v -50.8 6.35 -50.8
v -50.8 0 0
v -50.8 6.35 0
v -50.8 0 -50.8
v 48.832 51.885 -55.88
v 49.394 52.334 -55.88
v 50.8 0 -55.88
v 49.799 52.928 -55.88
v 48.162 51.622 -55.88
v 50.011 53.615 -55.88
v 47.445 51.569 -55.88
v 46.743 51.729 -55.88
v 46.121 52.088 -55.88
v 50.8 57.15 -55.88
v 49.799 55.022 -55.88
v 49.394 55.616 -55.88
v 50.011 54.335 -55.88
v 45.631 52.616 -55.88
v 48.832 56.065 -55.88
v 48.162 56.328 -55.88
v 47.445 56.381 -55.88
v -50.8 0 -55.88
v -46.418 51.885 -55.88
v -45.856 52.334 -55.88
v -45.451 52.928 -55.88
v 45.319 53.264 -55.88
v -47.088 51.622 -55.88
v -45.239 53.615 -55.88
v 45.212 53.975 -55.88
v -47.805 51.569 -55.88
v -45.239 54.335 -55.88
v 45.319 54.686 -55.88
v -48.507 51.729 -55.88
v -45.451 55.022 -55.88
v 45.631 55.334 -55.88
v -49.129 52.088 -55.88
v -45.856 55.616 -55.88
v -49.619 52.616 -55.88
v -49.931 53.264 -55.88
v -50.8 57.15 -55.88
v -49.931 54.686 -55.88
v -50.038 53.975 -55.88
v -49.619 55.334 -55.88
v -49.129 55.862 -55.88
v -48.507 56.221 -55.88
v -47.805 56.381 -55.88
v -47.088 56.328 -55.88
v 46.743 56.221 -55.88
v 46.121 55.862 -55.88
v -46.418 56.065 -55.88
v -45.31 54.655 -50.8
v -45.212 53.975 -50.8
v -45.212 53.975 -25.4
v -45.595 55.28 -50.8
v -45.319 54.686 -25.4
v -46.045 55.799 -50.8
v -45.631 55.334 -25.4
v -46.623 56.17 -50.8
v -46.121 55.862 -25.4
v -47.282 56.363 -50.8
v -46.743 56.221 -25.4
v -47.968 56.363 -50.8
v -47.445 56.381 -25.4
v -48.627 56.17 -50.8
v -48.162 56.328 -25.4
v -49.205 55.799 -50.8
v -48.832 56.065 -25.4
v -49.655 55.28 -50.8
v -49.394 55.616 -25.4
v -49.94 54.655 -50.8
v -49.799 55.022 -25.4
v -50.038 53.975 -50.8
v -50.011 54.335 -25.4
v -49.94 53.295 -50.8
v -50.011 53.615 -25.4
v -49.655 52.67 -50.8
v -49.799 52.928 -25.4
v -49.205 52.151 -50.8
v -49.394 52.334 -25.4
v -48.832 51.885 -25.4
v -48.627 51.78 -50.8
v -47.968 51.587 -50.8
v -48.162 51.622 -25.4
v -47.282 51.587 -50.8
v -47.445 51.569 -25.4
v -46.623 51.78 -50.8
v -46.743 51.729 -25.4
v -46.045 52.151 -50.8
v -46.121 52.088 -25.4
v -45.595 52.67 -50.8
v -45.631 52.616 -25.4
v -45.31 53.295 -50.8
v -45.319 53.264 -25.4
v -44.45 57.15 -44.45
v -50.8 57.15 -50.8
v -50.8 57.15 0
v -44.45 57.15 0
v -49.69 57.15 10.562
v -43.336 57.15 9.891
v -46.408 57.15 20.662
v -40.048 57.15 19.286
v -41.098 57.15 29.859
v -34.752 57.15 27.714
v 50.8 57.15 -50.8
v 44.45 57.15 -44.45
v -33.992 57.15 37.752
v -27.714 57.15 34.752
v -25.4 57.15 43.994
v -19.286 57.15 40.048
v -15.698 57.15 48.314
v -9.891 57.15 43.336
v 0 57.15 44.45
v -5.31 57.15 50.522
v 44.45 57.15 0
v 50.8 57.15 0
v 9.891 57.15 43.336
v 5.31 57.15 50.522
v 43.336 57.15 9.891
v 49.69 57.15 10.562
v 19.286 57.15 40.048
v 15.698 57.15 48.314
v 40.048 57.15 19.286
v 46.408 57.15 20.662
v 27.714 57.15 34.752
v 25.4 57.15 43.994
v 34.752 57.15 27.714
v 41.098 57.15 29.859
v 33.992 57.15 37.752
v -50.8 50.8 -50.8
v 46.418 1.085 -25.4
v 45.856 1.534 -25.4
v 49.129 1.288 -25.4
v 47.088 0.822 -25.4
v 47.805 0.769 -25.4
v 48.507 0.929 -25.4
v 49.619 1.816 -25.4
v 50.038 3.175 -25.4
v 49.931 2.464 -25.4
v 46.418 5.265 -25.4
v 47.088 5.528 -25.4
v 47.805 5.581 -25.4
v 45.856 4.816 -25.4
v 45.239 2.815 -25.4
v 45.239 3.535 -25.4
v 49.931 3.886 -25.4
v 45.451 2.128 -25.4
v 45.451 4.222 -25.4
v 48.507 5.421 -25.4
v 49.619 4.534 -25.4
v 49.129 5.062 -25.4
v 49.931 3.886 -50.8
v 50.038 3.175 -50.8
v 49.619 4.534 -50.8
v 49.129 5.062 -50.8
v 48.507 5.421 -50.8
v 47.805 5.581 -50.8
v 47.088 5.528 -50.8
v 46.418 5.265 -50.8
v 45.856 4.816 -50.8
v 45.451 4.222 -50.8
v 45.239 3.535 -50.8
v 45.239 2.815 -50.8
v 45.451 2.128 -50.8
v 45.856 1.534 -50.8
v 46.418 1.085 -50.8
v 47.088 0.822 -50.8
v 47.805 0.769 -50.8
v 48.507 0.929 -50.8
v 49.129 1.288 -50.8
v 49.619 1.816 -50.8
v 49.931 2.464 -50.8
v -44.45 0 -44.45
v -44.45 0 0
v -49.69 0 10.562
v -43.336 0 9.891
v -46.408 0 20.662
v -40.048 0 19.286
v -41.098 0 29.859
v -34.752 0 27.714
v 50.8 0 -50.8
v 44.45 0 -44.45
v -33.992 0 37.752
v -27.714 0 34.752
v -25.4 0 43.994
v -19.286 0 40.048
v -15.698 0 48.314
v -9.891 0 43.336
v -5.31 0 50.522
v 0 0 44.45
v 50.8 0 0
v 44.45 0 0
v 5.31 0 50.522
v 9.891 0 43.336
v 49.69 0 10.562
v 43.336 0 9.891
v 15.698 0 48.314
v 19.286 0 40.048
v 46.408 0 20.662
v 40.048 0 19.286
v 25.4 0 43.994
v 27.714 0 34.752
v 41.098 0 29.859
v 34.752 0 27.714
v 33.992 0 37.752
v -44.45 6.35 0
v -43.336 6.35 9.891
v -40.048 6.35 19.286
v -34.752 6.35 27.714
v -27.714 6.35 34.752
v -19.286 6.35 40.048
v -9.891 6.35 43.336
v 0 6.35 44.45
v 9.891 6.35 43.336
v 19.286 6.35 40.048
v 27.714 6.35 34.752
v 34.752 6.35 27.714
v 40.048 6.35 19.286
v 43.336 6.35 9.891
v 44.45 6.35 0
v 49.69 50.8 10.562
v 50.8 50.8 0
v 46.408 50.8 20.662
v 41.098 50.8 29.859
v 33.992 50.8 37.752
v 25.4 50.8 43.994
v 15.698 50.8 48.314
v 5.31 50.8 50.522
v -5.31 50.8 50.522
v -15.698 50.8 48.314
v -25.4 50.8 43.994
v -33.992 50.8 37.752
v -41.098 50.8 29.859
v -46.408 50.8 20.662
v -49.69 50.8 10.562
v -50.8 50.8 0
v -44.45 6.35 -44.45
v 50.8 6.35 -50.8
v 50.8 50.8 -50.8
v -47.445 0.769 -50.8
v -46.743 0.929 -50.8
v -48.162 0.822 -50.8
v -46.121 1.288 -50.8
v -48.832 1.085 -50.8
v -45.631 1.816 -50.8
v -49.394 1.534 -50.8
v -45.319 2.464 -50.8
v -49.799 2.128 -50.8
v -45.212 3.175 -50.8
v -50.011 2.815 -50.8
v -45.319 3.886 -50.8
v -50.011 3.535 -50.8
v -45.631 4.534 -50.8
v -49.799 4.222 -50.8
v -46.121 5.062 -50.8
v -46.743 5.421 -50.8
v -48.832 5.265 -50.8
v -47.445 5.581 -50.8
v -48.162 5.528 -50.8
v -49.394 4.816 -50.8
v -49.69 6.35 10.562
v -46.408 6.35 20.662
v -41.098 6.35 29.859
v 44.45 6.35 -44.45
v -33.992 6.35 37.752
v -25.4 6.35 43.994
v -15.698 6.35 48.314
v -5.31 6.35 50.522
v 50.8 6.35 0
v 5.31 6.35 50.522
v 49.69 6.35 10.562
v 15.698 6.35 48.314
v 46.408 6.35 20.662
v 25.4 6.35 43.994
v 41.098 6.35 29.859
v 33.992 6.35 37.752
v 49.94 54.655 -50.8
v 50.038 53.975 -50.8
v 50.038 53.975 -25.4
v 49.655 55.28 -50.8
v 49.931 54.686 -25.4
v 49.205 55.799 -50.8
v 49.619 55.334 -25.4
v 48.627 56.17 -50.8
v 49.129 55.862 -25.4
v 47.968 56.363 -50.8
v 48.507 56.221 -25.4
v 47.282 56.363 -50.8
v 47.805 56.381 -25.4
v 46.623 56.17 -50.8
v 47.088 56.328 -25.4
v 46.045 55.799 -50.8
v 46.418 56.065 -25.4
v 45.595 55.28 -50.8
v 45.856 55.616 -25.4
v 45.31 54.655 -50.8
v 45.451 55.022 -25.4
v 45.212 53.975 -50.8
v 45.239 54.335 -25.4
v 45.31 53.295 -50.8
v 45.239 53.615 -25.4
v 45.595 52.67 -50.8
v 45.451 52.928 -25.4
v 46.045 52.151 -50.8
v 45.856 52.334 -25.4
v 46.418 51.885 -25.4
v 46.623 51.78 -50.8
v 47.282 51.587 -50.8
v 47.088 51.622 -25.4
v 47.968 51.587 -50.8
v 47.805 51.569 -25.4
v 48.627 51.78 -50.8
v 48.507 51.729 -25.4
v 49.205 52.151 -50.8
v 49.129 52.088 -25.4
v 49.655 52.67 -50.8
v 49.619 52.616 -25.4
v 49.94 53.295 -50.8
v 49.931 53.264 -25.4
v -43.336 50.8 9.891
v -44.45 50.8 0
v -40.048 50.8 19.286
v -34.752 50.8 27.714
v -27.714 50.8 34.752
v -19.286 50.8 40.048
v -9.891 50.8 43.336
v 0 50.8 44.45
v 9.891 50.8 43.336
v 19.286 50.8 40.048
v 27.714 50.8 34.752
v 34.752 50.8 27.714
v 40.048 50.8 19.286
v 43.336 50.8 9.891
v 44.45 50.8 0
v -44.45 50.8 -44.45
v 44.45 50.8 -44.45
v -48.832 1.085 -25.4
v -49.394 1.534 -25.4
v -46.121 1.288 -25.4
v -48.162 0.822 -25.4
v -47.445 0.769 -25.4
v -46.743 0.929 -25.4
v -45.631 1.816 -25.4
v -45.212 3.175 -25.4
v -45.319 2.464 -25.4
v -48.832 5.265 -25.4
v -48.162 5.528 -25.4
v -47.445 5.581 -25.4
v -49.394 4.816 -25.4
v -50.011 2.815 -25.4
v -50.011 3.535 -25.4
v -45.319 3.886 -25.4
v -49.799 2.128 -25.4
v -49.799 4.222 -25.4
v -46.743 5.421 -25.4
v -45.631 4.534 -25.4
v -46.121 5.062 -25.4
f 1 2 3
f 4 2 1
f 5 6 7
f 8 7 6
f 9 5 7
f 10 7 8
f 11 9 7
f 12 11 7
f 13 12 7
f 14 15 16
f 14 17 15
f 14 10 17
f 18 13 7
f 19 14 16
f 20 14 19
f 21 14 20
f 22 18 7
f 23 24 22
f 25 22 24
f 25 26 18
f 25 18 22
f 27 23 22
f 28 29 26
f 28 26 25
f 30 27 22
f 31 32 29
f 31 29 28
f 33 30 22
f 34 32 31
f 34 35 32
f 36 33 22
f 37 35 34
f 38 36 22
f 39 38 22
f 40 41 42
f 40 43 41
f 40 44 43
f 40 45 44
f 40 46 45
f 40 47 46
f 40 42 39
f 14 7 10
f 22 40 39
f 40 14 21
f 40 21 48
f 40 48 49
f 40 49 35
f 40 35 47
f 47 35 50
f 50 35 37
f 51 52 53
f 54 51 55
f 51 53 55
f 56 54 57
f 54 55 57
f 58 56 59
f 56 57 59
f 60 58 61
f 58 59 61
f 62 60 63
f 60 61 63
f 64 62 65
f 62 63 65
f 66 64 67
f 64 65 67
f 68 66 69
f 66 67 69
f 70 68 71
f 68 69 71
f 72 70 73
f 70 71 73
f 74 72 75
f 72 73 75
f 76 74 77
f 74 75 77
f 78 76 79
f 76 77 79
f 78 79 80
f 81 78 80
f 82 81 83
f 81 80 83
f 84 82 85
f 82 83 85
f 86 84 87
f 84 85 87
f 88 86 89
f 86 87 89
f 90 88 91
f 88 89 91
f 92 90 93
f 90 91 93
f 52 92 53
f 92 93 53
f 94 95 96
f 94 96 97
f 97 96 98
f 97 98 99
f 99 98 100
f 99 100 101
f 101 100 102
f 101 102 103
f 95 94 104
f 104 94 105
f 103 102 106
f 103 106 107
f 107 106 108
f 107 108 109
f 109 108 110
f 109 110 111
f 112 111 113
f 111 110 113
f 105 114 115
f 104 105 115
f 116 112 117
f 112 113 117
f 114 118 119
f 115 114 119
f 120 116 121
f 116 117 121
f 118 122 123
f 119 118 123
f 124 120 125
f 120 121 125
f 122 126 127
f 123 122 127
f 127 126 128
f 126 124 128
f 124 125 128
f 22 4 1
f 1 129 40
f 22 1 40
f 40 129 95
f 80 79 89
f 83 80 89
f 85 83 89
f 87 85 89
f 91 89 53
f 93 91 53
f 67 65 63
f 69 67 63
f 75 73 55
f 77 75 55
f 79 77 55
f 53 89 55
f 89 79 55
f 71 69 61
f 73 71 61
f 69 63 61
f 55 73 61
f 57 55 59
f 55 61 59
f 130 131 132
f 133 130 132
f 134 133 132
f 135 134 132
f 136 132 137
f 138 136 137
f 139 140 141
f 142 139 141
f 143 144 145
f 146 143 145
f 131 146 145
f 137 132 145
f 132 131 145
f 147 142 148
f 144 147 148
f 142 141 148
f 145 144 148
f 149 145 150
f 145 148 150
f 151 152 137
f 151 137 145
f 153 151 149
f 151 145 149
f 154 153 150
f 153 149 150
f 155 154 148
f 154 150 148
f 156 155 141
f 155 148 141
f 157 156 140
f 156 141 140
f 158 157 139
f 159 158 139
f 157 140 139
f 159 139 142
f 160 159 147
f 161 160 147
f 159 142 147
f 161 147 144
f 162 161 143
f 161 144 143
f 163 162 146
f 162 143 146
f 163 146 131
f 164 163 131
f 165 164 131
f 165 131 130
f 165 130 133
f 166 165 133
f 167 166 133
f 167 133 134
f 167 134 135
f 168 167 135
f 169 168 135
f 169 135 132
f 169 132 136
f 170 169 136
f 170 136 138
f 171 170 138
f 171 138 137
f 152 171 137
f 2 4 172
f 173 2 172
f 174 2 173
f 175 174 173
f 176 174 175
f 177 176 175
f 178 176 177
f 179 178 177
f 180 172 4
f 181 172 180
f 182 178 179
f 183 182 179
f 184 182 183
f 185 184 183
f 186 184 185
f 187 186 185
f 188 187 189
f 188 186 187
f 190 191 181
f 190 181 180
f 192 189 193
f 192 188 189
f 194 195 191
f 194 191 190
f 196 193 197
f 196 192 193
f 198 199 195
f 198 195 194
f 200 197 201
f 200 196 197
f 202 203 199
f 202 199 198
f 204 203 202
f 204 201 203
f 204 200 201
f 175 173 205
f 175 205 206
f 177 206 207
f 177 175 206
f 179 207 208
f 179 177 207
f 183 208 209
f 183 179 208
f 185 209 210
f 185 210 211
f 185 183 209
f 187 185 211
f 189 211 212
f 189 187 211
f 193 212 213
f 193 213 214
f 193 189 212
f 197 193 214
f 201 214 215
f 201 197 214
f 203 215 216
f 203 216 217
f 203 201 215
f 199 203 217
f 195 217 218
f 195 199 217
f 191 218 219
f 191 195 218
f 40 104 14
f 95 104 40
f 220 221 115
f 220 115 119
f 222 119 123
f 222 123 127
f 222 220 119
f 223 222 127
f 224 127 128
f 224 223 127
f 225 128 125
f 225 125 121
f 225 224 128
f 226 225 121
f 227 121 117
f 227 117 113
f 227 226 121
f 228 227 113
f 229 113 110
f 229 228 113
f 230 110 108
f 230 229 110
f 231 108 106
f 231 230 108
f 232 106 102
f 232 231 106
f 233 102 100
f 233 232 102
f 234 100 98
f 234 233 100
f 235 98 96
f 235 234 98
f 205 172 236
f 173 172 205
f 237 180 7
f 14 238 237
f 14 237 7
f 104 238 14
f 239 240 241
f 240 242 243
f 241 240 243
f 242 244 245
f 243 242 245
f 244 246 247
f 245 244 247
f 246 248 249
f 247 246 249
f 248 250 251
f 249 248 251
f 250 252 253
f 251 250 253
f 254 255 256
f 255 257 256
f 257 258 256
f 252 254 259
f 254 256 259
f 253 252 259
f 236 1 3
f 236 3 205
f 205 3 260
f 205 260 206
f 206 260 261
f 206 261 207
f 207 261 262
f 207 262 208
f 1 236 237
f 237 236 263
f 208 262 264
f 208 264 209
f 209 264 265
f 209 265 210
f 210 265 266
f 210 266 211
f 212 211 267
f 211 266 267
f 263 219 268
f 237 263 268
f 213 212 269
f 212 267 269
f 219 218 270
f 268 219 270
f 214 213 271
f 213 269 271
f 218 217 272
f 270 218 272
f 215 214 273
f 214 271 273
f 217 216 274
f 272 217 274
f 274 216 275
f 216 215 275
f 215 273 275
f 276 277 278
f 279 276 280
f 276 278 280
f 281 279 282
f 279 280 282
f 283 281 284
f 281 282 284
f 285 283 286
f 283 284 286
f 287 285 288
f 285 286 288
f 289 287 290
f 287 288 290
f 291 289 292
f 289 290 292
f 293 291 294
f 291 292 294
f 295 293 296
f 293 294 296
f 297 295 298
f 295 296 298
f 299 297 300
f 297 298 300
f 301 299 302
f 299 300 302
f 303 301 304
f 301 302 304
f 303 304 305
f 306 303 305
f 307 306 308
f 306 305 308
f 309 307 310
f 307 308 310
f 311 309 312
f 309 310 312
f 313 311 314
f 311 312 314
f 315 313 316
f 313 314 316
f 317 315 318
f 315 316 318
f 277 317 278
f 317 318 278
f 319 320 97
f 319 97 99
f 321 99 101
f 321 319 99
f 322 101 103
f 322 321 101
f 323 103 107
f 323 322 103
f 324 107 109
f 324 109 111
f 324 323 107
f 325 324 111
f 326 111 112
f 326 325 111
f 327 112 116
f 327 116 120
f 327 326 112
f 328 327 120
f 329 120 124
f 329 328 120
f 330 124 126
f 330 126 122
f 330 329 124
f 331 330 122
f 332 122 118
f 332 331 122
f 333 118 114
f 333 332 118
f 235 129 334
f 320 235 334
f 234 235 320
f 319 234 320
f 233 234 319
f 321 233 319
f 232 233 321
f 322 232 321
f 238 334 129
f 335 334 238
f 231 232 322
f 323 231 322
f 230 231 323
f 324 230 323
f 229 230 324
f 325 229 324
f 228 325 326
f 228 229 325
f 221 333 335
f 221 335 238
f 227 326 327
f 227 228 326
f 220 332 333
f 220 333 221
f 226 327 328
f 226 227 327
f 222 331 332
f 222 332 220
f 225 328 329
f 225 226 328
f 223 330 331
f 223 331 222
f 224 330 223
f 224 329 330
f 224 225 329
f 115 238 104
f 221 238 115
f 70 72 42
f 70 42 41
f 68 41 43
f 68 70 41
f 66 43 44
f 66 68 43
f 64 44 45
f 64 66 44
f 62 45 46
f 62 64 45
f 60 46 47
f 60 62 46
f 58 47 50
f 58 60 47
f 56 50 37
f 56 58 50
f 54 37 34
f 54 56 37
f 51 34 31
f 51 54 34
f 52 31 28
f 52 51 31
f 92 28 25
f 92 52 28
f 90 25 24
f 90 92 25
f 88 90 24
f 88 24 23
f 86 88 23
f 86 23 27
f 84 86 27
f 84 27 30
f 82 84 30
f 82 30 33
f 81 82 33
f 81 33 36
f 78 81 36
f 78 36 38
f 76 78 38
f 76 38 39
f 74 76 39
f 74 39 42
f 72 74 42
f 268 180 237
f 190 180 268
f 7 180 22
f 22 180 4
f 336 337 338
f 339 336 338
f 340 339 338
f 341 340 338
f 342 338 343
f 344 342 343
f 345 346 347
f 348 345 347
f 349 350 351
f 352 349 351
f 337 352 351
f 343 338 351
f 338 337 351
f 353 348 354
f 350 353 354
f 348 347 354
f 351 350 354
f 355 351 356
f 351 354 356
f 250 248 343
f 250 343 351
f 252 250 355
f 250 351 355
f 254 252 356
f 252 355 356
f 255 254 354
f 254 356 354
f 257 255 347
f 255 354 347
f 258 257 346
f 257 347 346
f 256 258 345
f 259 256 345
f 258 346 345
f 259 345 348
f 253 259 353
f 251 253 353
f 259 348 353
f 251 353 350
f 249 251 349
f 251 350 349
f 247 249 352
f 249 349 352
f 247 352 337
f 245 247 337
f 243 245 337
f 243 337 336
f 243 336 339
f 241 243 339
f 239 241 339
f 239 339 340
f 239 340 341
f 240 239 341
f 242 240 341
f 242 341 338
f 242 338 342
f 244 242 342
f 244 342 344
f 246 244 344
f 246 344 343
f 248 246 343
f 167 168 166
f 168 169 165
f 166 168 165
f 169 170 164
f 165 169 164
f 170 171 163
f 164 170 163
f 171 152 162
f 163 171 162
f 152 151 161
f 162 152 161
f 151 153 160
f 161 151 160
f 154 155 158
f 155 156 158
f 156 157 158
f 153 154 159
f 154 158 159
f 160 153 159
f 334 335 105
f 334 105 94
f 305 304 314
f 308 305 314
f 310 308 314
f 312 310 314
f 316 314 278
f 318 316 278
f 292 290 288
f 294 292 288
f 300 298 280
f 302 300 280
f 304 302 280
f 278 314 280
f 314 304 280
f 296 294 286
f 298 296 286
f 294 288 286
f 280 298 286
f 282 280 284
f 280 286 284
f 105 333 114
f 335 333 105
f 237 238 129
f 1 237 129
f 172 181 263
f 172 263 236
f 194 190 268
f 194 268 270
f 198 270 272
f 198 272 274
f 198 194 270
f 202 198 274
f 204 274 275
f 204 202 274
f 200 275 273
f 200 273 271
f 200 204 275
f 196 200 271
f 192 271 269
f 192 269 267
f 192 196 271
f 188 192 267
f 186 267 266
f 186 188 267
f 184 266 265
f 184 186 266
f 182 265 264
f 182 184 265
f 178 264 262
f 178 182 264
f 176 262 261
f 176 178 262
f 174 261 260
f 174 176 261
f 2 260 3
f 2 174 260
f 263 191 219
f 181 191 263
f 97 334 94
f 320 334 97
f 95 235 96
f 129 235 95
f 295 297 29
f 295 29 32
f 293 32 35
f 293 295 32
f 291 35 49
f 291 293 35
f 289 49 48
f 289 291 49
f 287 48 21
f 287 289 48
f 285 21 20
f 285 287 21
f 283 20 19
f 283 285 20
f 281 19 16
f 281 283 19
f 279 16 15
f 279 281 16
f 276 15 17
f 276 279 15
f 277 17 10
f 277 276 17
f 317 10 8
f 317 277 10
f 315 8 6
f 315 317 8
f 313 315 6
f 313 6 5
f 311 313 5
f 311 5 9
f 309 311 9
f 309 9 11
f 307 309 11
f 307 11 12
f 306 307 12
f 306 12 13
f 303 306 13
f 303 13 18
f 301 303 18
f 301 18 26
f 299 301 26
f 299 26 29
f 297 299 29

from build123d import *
from build123d.topology import SkipClean

# Parameters (mm, degrees)
EXTRUSION1_DEPTH           = 6.35
HOLE1_D                    = 4.826
HOLE1_DEPTH                = 25.4
RECTANGULAR_PATTERN1_COUNT = 2
RECTANGULAR_PATTERN1_PITCH = 50.8
SKETCH6_W                  = 101.6
SKETCH6_H                  = 57.15
SKETCH6_R                  = 2.413
EXTRUSION3_DEPTH           = 5.08


with BuildPart() as part:
    # Sketch1 → Extrusion1 (new body)
    with BuildSketch(Plane(origin=(0, 0, 0), x_dir=(-1, 0, 0), z_dir=(0, 1, 0))):
        with BuildLine():
            Line((-50.8, -50.8), (50.8, -50.8))
            Line((50.8, -50.8), (50.8, 0))
            ThreePointArc((50.8, 0), (0, 50.8), (-50.8, 0))
            Line((-50.8, 0), (-50.8, -50.8))
        make_face()
        with BuildLine():
            Line((44.45, 0), (44.45, -44.45))
            Line((44.45, -44.45), (-44.45, -44.45))
            Line((-44.45, -44.45), (-44.45, 0))
            ThreePointArc((-44.45, 0), (0, 44.45), (44.45, 0))
        make_face(mode=Mode.SUBTRACT)
    extrude(amount=EXTRUSION1_DEPTH)

    # Hole1
    with Locations(Plane(origin=(0, 0, -50.8), x_dir=(-1, 0, 0), z_dir=(0, 0, -1))):
        with Locations((-47.625, 3.175), (47.625, 3.175)):
            Hole(HOLE1_D / 2, depth=HOLE1_DEPTH)


with BuildPart() as rectangular_pattern1_1:
    # Rectangular Pattern1: pattern copy
    add(part.part.moved(Location(Vector(0, 1, 0) * (1 * RECTANGULAR_PATTERN1_PITCH))))


with BuildPart() as part_1:
    with SkipClean():  # the faces are left unmerged after this step: merging them gives an invalid solid
        add(part.part)

        add(rectangular_pattern1_1.part)  # Extrusion3 merges Rectangular Pattern1_1
        # Sketch6 → Extrusion3 (add)
        with BuildSketch(Plane(origin=(0, 0, -50.8), x_dir=(-1, 0, 0), z_dir=(0, 0, -1))):
            with Locations((0, 28.575)):
                Rectangle(SKETCH6_W, SKETCH6_H)
            with Locations((-47.625, 53.975)):
                Circle(SKETCH6_R, mode=Mode.SUBTRACT)
            with Locations((47.625, 53.975)):
                Circle(SKETCH6_R, mode=Mode.SUBTRACT)
        extrude(amount=EXTRUSION3_DEPTH)


solid = part_1.part
